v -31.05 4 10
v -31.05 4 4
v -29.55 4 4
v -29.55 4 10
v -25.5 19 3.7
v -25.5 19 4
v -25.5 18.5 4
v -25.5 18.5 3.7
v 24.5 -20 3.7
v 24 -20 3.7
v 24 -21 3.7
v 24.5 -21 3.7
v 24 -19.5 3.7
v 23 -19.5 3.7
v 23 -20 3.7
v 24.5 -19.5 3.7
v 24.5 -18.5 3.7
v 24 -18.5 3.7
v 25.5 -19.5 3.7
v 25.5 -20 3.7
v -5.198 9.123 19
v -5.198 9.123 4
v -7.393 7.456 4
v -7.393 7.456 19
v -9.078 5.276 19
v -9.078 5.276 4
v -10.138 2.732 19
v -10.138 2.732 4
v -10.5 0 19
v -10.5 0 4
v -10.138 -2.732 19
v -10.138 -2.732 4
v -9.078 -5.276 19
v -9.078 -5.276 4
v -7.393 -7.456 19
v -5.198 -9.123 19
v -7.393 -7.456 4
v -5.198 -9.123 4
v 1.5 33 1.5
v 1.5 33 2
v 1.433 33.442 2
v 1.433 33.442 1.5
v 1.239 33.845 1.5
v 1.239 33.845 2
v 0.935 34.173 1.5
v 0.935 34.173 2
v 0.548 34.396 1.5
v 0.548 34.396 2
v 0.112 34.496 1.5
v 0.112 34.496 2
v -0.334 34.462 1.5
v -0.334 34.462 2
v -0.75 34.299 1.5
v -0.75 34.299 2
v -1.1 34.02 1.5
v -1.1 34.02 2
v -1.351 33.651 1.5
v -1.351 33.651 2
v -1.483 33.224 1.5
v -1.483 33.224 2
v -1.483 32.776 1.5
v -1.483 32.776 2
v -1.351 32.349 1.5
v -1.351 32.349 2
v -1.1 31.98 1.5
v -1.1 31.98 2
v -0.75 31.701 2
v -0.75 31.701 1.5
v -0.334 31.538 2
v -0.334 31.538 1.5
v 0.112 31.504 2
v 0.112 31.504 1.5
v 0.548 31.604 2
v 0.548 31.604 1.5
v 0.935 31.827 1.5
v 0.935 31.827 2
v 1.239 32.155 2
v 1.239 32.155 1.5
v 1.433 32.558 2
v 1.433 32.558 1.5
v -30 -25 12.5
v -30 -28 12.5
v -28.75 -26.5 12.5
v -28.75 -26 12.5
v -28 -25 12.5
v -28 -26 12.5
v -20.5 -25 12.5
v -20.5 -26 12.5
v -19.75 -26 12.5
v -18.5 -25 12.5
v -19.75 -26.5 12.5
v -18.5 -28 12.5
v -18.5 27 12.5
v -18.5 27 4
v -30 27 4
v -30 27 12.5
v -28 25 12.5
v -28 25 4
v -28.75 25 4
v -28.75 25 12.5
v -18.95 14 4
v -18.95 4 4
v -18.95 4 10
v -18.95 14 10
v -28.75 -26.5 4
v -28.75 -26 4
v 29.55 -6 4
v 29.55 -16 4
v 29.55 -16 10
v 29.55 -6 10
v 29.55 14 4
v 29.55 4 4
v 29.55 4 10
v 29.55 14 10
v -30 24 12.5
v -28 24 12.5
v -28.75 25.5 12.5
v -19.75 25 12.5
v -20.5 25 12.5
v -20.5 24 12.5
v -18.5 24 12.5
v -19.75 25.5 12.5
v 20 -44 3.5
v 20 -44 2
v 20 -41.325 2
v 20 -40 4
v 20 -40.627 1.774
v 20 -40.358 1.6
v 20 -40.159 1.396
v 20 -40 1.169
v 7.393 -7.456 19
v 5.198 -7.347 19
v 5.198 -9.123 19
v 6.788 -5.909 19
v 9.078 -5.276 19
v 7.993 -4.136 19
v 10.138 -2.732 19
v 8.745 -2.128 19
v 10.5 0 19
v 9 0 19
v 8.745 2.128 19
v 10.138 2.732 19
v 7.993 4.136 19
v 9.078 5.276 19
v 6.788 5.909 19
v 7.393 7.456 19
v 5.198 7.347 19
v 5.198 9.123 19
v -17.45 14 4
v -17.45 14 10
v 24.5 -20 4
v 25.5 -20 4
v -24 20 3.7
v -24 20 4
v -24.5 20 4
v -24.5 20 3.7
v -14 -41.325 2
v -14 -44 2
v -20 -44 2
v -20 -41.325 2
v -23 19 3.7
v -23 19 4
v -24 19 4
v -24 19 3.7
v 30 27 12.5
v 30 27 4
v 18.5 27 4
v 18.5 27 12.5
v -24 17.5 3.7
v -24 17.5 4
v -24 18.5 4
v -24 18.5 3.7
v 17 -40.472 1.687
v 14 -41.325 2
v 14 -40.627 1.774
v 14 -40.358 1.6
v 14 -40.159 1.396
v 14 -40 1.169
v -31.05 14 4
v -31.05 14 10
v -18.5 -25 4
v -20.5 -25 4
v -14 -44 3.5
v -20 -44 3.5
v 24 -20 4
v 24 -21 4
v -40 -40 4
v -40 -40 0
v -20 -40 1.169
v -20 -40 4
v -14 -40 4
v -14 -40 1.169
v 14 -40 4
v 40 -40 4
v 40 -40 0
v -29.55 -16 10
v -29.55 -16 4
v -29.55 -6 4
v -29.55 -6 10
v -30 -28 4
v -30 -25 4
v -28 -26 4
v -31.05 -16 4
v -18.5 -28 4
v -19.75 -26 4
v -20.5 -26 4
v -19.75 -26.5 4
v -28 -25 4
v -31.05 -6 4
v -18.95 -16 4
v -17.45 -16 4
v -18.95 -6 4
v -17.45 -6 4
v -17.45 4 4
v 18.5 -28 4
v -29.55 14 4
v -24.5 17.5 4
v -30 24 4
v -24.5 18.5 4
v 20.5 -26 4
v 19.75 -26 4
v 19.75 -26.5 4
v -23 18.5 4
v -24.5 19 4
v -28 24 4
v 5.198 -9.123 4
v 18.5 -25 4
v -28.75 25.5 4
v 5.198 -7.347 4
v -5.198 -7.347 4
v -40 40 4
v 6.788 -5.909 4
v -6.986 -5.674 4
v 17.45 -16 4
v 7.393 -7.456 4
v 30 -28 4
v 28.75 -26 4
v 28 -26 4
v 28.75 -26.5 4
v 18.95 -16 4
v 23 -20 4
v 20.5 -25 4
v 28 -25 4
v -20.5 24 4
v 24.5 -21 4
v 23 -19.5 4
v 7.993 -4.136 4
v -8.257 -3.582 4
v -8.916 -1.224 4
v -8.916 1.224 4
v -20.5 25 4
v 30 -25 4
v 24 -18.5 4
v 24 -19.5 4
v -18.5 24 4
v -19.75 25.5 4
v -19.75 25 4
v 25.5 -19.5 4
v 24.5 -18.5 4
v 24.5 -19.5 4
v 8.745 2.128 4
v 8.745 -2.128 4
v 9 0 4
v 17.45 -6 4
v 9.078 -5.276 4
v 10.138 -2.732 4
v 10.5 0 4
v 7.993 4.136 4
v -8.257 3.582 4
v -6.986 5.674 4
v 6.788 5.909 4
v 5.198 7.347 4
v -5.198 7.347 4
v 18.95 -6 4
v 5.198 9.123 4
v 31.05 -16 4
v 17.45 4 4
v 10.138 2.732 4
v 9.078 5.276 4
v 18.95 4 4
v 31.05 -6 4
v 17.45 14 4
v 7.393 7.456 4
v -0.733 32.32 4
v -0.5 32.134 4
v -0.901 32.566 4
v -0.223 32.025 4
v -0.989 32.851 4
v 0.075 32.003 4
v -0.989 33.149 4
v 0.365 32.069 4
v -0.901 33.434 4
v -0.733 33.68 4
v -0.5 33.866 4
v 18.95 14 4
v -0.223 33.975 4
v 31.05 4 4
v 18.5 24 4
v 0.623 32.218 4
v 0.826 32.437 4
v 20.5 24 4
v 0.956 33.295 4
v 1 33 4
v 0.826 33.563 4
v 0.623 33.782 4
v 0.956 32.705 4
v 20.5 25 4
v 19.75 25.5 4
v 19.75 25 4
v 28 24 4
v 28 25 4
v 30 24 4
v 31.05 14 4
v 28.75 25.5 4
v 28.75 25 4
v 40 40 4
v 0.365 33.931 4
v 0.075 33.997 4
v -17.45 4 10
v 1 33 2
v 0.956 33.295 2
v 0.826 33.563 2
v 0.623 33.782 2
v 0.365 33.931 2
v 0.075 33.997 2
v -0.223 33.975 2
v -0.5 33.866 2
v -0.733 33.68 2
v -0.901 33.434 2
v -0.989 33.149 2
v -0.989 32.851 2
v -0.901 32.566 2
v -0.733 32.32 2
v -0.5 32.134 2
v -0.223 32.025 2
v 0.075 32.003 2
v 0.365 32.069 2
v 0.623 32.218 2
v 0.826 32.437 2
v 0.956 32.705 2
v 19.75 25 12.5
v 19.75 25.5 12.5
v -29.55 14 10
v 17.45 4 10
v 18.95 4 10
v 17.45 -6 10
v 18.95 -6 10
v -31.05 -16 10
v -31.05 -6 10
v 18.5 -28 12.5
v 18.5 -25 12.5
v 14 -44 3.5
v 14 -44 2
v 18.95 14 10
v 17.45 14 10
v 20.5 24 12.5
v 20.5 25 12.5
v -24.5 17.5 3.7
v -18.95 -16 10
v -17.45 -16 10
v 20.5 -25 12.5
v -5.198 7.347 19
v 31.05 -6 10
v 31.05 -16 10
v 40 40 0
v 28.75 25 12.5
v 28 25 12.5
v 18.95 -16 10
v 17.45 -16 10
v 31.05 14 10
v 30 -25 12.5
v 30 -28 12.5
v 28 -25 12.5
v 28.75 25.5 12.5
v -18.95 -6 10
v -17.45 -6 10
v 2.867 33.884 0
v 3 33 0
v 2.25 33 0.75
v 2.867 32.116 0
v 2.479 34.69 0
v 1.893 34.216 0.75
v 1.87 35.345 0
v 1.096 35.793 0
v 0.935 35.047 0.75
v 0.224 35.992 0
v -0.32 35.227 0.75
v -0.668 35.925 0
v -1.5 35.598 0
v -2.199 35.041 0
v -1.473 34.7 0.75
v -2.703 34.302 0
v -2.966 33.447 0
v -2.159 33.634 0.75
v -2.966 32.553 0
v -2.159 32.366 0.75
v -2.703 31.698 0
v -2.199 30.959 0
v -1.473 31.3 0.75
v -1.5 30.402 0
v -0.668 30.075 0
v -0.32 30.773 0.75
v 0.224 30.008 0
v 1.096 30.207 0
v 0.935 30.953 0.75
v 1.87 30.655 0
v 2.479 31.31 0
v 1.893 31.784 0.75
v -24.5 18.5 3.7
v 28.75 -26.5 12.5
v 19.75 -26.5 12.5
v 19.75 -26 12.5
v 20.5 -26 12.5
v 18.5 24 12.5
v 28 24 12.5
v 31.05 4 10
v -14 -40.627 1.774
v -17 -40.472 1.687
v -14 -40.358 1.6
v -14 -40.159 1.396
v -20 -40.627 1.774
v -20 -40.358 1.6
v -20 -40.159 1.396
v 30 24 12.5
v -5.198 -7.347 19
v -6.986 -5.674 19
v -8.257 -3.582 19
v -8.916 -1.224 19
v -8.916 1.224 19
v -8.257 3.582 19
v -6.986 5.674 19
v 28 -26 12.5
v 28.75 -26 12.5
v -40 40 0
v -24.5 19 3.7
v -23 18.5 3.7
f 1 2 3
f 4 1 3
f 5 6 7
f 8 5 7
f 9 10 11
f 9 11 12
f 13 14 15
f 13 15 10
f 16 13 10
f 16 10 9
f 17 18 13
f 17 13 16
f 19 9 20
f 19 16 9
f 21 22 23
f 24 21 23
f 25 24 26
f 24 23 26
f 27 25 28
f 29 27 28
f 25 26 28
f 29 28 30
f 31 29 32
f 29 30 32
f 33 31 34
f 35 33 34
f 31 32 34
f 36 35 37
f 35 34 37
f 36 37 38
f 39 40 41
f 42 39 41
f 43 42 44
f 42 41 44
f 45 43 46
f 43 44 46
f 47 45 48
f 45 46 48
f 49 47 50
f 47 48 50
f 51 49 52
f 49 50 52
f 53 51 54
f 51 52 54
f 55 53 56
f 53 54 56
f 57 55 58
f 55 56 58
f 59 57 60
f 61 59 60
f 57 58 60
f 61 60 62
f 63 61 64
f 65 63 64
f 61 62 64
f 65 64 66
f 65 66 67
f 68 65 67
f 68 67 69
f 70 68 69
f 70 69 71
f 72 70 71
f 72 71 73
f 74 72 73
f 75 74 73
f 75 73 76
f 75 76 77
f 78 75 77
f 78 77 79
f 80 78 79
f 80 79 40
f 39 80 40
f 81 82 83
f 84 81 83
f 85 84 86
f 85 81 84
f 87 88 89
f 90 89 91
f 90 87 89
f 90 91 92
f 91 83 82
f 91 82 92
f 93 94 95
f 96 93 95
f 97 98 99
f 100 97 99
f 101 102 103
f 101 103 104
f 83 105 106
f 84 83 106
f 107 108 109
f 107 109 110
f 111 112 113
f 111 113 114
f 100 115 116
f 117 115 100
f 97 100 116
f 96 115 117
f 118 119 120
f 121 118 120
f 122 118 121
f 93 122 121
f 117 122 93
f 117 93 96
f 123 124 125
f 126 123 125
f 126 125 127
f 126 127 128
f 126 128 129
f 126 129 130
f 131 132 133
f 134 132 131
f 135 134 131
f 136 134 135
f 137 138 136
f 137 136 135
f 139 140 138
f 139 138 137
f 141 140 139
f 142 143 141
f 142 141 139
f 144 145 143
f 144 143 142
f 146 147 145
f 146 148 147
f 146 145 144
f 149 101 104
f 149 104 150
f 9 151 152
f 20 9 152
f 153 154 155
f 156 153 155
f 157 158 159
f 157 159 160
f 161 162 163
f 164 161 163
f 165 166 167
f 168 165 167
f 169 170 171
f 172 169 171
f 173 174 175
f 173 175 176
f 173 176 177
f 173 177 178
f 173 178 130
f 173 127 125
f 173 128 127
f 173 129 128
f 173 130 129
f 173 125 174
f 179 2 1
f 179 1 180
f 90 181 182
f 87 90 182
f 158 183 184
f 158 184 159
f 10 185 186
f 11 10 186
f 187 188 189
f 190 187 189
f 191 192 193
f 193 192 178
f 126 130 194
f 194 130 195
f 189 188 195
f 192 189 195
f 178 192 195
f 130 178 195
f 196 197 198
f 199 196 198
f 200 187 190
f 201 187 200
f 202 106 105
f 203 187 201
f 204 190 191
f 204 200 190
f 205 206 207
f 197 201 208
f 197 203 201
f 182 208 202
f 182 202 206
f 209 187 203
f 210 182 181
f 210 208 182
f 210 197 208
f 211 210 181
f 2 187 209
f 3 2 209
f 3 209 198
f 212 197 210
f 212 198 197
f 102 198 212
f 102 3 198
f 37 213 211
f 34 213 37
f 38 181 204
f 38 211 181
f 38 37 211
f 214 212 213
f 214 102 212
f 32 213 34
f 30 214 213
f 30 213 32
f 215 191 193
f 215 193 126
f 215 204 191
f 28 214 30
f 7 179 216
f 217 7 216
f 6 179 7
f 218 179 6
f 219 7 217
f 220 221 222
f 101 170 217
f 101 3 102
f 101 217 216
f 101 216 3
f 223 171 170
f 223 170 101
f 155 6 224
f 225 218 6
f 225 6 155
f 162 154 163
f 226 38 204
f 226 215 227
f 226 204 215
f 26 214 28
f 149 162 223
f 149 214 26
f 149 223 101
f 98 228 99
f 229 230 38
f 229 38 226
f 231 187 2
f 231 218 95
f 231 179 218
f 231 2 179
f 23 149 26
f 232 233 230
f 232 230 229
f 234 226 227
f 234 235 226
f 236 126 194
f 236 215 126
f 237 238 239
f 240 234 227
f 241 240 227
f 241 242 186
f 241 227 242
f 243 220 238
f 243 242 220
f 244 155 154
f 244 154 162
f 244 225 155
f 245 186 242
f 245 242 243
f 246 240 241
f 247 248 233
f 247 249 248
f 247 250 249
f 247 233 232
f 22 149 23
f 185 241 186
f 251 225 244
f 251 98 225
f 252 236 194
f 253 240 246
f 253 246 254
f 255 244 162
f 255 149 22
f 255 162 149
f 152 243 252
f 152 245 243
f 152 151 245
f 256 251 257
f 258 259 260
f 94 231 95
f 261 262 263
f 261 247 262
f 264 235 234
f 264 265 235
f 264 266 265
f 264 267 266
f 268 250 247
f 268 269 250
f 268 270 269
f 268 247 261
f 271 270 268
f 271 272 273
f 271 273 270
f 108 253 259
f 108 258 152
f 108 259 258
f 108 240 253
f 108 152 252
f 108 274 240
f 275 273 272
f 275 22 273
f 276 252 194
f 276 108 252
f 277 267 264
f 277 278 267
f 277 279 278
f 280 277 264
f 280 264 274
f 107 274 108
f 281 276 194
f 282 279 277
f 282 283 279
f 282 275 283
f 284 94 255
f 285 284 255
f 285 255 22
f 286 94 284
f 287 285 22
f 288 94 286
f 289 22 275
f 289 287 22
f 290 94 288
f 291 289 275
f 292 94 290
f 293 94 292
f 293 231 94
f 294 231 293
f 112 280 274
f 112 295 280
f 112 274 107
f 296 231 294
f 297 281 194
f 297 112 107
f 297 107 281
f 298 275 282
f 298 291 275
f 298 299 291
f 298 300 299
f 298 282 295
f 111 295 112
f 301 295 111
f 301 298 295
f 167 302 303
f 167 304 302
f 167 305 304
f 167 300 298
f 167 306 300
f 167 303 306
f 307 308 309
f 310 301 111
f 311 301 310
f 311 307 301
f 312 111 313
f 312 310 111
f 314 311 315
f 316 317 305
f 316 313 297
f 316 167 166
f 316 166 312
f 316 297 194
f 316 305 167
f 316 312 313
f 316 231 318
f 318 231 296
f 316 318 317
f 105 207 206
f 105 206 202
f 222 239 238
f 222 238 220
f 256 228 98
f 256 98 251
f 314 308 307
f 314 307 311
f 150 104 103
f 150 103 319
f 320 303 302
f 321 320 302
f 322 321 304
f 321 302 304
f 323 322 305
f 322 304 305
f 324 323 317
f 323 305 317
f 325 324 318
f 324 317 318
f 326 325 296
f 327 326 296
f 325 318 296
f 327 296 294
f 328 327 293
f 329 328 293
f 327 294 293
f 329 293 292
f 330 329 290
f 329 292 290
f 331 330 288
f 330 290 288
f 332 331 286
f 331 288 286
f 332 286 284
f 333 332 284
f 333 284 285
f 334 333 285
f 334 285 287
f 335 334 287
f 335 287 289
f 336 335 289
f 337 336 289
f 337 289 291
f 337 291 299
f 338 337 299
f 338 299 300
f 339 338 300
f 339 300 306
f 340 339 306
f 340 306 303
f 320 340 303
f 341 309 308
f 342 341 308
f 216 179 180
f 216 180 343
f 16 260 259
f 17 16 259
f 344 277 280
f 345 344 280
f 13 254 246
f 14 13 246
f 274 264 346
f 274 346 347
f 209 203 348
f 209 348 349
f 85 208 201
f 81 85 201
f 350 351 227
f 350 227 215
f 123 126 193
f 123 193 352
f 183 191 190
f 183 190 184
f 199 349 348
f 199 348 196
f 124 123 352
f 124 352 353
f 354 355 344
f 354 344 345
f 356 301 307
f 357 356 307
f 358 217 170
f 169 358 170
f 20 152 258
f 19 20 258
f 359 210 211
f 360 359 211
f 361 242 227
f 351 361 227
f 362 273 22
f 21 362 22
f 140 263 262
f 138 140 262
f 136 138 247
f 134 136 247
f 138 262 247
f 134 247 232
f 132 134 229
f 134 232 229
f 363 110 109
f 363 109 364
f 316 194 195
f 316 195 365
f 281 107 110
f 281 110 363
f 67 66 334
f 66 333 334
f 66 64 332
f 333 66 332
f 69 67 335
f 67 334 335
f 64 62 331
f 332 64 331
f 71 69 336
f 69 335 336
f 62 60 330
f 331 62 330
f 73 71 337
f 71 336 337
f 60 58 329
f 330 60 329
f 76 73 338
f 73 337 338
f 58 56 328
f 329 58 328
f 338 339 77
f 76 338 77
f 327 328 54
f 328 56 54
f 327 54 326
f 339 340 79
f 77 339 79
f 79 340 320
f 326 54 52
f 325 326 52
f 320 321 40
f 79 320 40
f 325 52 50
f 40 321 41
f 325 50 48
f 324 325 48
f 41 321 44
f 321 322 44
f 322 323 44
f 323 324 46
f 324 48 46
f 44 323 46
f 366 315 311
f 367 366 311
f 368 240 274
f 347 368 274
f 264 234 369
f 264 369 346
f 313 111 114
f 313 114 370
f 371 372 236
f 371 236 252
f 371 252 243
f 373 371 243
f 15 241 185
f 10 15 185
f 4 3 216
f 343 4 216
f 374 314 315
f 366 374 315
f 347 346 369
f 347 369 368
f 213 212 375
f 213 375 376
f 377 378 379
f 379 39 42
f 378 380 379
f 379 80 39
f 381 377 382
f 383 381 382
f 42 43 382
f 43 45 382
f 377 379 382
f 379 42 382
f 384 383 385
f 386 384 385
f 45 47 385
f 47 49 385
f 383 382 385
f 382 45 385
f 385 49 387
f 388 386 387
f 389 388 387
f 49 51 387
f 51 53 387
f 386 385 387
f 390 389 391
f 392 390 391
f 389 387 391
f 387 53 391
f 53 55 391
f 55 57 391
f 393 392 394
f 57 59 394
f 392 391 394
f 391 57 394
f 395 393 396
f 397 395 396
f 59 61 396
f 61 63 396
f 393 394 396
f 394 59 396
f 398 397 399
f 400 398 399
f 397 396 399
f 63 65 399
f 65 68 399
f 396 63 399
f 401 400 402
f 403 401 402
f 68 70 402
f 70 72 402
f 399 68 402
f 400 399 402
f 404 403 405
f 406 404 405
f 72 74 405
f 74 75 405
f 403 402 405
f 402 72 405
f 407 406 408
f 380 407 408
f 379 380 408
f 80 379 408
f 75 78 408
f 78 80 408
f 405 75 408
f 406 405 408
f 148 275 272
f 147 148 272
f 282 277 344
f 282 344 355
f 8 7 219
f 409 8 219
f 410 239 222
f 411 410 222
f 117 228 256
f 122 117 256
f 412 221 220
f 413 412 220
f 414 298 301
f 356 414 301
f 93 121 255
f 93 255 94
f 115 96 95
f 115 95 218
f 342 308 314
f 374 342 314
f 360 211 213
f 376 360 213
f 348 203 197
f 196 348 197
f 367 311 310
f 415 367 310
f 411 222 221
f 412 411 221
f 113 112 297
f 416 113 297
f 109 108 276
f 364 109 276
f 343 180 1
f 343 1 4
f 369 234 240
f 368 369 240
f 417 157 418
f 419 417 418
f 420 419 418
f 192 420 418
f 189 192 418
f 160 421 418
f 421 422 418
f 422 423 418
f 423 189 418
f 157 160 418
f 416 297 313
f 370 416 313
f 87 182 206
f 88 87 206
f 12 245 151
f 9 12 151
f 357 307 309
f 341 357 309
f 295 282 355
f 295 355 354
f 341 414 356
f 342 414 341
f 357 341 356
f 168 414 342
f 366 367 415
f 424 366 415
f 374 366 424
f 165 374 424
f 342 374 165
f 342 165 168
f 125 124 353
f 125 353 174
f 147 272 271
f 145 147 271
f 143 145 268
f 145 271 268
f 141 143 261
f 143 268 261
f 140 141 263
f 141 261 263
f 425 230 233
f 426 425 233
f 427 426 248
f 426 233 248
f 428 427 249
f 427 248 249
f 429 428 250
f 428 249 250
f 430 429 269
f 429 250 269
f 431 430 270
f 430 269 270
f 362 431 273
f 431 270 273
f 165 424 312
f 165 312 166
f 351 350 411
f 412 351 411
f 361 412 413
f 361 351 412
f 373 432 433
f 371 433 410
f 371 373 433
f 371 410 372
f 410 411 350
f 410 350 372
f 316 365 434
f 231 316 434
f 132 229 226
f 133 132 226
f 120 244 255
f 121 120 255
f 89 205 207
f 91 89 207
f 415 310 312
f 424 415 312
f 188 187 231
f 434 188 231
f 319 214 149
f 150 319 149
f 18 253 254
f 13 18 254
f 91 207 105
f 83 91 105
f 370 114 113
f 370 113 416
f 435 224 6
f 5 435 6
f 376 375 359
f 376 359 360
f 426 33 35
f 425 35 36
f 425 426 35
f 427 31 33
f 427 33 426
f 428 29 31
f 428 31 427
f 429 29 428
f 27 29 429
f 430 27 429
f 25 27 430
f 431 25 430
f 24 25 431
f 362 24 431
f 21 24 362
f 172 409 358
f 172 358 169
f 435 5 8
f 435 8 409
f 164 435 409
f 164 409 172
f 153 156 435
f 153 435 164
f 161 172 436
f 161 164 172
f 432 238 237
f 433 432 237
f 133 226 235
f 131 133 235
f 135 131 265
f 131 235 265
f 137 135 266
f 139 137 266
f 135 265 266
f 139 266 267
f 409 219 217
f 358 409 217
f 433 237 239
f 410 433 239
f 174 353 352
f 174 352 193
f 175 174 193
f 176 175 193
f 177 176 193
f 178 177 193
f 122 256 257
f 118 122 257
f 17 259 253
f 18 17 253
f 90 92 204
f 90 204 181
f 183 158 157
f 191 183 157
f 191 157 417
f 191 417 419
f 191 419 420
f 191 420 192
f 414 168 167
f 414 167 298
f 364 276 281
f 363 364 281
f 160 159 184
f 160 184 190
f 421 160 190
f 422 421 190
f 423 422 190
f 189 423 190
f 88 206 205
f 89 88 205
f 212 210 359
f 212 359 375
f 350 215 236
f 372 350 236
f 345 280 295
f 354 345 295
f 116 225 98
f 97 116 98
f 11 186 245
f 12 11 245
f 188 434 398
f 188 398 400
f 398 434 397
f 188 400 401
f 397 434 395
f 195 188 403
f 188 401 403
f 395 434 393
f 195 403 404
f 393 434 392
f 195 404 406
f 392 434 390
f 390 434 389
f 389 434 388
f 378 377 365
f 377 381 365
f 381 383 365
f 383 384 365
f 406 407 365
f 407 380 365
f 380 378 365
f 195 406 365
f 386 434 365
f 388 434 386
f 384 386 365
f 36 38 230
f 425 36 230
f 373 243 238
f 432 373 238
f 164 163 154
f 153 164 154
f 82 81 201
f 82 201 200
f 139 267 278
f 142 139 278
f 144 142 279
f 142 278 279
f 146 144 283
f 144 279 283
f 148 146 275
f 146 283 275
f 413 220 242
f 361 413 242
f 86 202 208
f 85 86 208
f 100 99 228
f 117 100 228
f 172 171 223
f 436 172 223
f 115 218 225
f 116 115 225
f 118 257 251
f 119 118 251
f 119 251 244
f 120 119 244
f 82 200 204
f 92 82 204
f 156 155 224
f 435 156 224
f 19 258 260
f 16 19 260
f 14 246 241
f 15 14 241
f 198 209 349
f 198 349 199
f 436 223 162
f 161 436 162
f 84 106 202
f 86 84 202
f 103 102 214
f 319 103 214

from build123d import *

# Parameters (mm, degrees)
F1_DEPTH       = 4
F2_W           = 1.5
F2_H           = 10
F3_DEPTH       = 6
F2_W_2         = 7.5
F2_H_2         = 1.5
F4_DEPTH       = 8.5
F5_R           = 1
F6_DEPTH       = 25
F7_START       = -2
F5_R_2         = 1.5
F7_DEPTH       = 23
F8_SIZE        = 1.5
F10_DEPTH      = 40
F10_DEPTH_BACK = 40
F0_W           = 20
F0_H           = 4
F0_W_2         = 28
F11_DEPTH      = 18.6
F12_DEPTH      = 0.3
F14_DEPTH      = 15


with BuildPart() as f1:
    # F0 (on Top) → F1 (new body)
    with BuildSketch(Plane.XY):
        Polygon((40, 40), (-40, 40), (-40, -40), (-20, -40), (-14, -40), (14, -40), (20, -40), (40, -40), align=None)
    extrude(amount=F1_DEPTH)

    # F2 (on face) → F3 (join)
    with BuildSketch(Plane.XY.offset(4)):
        with Locations((-30.3, -11)):
            Rectangle(F2_W, F2_H)
        with Locations((-18.2, -11)):
            Rectangle(F2_W, F2_H)
        with Locations((-18.2, 9)):
            Rectangle(F2_W, F2_H)
        with Locations((-30.3, 9)):
            Rectangle(F2_W, F2_H)
        with Locations((18.2, -11)):
            Rectangle(F2_W, F2_H)
        with Locations((18.2, 9)):
            Rectangle(F2_W, F2_H)
        with Locations((30.3, 9)):
            Rectangle(F2_W, F2_H)
        with Locations((30.3, -11)):
            Rectangle(F2_W, F2_H)
    extrude(amount=F3_DEPTH)

    # F2 (on face) → F4 (join)
    with BuildSketch(Plane.XY.offset(4)):
        Polygon((-28, 27), (-30, 27), (-30, 24), (-28, 24), (-28, 25), (-28.75, 25), (-28.75, 25.5), (-28, 25.5), align=None)
        with Locations((-24.25, 26.25)):
            Rectangle(F2_W_2, F2_H_2)
        Polygon((-18.5, 27), (-20.5, 27), (-20.5, 25.5), (-19.75, 25.5), (-19.75, 25), (-20.5, 25), (-20.5, 24), (-18.5, 24), align=None)
        Polygon((-20.5, -28), (-18.5, -28), (-18.5, -25), (-20.5, -25), (-20.5, -26), (-19.75, -26), (-19.75, -26.5), (-20.5, -26.5), align=None)
        with Locations((-24.25, -27.25)):
            Rectangle(F2_W_2, F2_H_2)
        Polygon((-30, -28), (-28, -28), (-28, -26.5), (-28.75, -26.5), (-28.75, -26), (-28, -26), (-28, -25), (-30, -25), align=None)
        Polygon((20.5, 27), (18.5, 27), (18.5, 24), (20.5, 24), (20.5, 25), (19.75, 25), (19.75, 25.5), (20.5, 25.5), align=None)
        with Locations((24.25, 26.25)):
            Rectangle(F2_W_2, F2_H_2)
        Polygon((30, 27), (28, 27), (28, 25.5), (28.75, 25.5), (28.75, 25), (28, 25), (28, 24), (30, 24), align=None)
        Polygon((28, -28), (30, -28), (30, -25), (28, -25), (28, -26), (28.75, -26), (28.75, -26.5), (28, -26.5), align=None)
        with Locations((24.25, -27.25)):
            Rectangle(F2_W_2, F2_H_2)
        Polygon((18.5, -28), (20.5, -28), (20.5, -26.5), (19.75, -26.5), (19.75, -26), (20.5, -26), (20.5, -25), (18.5, -25), align=None)
    extrude(amount=F4_DEPTH)

    # F5 (on face) → F6 (cut)
    with BuildSketch(Plane.XY.offset(4)):
        with Locations((0, 33)):
            Circle(F5_R)
    extrude(amount=-F6_DEPTH, mode=Mode.SUBTRACT)

    # F5 (on face) → F7 (cut)
    with BuildSketch(Plane.XY.offset(4).offset(F7_START)):
        with Locations((0, 33)):
            Circle(F5_R_2)
        with Locations((0, 33)):
            Circle(F5_R, mode=Mode.SUBTRACT)
    extrude(amount=-F7_DEPTH, mode=Mode.SUBTRACT)

    # F8
    f8_edges = [f1.edges().sort_by_distance(p)[0] for p in [
        (-1.5, 33, 0),
    ]]
    chamfer(f8_edges, length=F8_SIZE)

    # F9 (on Right) → F10 (join, two sides)
    with BuildSketch(Plane.YZ) as f10_sk:
        Polygon((-44, 3.5), (-44, 2), (-41.3253502548, 2), (-40, 2), (-40, 4), align=None)
        with BuildLine():
            Line((-40, 2), (-41.3253502548, 2))
            add(Edge.make_bspline(
                [(-40, 1.1688865488), (-40.1044214362, 1.3442346056), (-40.4564972437, 1.788672813), (-40.9847019479, 1.899783813), (-41.3253502548, 2)],
                knots=[0, 0, 0, 0, 0.4675971857, 1, 1, 1, 1], degree=3))
            Line((-40, 1.1688865488), (-40, 2))
        make_face()
    extrude(amount=F10_DEPTH)
    extrude(f10_sk.sketch, amount=-F10_DEPTH_BACK)

    # F0 (on Top) → F11 (cut)
    with BuildSketch(Plane.XY):
        with Locations((-30, -42)):
            Rectangle(F0_W, F0_H)
        with Locations((0, -42)):
            Rectangle(F0_W_2, F0_H)
        with Locations((30, -42)):
            Rectangle(F0_W, F0_H)
    extrude(amount=F11_DEPTH, mode=Mode.SUBTRACT)

    # F2 (on face) → F12 (cut)
    with BuildSketch(Plane.XY.offset(4)):
        Polygon((-24, 20), (-24.5, 20), (-24.5, 19), (-25.5, 19), (-25.5, 18.5), (-24.5, 18.5), (-24.5, 17.5), (-24, 17.5), (-24, 18.5), (-23, 18.5), (-23, 19), (-24, 19), align=None)
        Polygon((24.5, -18.5), (24, -18.5), (24, -19.5), (23, -19.5), (23, -20), (24, -20), (24, -21), (24.5, -21), (24.5, -20), (25.5, -20), (25.5, -19.5), (24.5, -19.5), align=None)
    extrude(amount=-F12_DEPTH, mode=Mode.SUBTRACT)

    # F13 (on face) → F14 (join)
    with BuildSketch(Plane.XY.offset(4)):
        with BuildLine():
            ThreePointArc((-5.1981253765, -7.347073742), (-9, 0), (-5.1981253765, 7.347073742))
            Line((-5.1981253765, 7.347073742), (-5.1981253765, 9.123019926))
            ThreePointArc((-5.1981253765, 9.123019926), (-10.5, 0), (-5.1981253765, -9.123019926))
            Line((-5.1981253765, -9.123019926), (-5.1981253765, -7.347073742))
        make_face()
        with BuildLine():
            ThreePointArc((5.1981253765, 7.347073742), (7.993219889, 4.136234496), (9, 0))
            ThreePointArc((9, 0), (7.993219889, -4.136234496), (5.1981253765, -7.347073742))
            Line((5.1981253765, -7.347073742), (5.1981253765, -9.123019926))
            ThreePointArc((5.1981253765, -9.123019926), (9.078279475, -5.2758735555), (10.5, 0))
            ThreePointArc((10.5, 0), (9.078279475, 5.2758735555), (5.1981253765, 9.123019926))
            Line((5.1981253765, 9.123019926), (5.1981253765, 7.347073742))
        make_face()
    extrude(amount=F14_DEPTH)


solid = f1.part
